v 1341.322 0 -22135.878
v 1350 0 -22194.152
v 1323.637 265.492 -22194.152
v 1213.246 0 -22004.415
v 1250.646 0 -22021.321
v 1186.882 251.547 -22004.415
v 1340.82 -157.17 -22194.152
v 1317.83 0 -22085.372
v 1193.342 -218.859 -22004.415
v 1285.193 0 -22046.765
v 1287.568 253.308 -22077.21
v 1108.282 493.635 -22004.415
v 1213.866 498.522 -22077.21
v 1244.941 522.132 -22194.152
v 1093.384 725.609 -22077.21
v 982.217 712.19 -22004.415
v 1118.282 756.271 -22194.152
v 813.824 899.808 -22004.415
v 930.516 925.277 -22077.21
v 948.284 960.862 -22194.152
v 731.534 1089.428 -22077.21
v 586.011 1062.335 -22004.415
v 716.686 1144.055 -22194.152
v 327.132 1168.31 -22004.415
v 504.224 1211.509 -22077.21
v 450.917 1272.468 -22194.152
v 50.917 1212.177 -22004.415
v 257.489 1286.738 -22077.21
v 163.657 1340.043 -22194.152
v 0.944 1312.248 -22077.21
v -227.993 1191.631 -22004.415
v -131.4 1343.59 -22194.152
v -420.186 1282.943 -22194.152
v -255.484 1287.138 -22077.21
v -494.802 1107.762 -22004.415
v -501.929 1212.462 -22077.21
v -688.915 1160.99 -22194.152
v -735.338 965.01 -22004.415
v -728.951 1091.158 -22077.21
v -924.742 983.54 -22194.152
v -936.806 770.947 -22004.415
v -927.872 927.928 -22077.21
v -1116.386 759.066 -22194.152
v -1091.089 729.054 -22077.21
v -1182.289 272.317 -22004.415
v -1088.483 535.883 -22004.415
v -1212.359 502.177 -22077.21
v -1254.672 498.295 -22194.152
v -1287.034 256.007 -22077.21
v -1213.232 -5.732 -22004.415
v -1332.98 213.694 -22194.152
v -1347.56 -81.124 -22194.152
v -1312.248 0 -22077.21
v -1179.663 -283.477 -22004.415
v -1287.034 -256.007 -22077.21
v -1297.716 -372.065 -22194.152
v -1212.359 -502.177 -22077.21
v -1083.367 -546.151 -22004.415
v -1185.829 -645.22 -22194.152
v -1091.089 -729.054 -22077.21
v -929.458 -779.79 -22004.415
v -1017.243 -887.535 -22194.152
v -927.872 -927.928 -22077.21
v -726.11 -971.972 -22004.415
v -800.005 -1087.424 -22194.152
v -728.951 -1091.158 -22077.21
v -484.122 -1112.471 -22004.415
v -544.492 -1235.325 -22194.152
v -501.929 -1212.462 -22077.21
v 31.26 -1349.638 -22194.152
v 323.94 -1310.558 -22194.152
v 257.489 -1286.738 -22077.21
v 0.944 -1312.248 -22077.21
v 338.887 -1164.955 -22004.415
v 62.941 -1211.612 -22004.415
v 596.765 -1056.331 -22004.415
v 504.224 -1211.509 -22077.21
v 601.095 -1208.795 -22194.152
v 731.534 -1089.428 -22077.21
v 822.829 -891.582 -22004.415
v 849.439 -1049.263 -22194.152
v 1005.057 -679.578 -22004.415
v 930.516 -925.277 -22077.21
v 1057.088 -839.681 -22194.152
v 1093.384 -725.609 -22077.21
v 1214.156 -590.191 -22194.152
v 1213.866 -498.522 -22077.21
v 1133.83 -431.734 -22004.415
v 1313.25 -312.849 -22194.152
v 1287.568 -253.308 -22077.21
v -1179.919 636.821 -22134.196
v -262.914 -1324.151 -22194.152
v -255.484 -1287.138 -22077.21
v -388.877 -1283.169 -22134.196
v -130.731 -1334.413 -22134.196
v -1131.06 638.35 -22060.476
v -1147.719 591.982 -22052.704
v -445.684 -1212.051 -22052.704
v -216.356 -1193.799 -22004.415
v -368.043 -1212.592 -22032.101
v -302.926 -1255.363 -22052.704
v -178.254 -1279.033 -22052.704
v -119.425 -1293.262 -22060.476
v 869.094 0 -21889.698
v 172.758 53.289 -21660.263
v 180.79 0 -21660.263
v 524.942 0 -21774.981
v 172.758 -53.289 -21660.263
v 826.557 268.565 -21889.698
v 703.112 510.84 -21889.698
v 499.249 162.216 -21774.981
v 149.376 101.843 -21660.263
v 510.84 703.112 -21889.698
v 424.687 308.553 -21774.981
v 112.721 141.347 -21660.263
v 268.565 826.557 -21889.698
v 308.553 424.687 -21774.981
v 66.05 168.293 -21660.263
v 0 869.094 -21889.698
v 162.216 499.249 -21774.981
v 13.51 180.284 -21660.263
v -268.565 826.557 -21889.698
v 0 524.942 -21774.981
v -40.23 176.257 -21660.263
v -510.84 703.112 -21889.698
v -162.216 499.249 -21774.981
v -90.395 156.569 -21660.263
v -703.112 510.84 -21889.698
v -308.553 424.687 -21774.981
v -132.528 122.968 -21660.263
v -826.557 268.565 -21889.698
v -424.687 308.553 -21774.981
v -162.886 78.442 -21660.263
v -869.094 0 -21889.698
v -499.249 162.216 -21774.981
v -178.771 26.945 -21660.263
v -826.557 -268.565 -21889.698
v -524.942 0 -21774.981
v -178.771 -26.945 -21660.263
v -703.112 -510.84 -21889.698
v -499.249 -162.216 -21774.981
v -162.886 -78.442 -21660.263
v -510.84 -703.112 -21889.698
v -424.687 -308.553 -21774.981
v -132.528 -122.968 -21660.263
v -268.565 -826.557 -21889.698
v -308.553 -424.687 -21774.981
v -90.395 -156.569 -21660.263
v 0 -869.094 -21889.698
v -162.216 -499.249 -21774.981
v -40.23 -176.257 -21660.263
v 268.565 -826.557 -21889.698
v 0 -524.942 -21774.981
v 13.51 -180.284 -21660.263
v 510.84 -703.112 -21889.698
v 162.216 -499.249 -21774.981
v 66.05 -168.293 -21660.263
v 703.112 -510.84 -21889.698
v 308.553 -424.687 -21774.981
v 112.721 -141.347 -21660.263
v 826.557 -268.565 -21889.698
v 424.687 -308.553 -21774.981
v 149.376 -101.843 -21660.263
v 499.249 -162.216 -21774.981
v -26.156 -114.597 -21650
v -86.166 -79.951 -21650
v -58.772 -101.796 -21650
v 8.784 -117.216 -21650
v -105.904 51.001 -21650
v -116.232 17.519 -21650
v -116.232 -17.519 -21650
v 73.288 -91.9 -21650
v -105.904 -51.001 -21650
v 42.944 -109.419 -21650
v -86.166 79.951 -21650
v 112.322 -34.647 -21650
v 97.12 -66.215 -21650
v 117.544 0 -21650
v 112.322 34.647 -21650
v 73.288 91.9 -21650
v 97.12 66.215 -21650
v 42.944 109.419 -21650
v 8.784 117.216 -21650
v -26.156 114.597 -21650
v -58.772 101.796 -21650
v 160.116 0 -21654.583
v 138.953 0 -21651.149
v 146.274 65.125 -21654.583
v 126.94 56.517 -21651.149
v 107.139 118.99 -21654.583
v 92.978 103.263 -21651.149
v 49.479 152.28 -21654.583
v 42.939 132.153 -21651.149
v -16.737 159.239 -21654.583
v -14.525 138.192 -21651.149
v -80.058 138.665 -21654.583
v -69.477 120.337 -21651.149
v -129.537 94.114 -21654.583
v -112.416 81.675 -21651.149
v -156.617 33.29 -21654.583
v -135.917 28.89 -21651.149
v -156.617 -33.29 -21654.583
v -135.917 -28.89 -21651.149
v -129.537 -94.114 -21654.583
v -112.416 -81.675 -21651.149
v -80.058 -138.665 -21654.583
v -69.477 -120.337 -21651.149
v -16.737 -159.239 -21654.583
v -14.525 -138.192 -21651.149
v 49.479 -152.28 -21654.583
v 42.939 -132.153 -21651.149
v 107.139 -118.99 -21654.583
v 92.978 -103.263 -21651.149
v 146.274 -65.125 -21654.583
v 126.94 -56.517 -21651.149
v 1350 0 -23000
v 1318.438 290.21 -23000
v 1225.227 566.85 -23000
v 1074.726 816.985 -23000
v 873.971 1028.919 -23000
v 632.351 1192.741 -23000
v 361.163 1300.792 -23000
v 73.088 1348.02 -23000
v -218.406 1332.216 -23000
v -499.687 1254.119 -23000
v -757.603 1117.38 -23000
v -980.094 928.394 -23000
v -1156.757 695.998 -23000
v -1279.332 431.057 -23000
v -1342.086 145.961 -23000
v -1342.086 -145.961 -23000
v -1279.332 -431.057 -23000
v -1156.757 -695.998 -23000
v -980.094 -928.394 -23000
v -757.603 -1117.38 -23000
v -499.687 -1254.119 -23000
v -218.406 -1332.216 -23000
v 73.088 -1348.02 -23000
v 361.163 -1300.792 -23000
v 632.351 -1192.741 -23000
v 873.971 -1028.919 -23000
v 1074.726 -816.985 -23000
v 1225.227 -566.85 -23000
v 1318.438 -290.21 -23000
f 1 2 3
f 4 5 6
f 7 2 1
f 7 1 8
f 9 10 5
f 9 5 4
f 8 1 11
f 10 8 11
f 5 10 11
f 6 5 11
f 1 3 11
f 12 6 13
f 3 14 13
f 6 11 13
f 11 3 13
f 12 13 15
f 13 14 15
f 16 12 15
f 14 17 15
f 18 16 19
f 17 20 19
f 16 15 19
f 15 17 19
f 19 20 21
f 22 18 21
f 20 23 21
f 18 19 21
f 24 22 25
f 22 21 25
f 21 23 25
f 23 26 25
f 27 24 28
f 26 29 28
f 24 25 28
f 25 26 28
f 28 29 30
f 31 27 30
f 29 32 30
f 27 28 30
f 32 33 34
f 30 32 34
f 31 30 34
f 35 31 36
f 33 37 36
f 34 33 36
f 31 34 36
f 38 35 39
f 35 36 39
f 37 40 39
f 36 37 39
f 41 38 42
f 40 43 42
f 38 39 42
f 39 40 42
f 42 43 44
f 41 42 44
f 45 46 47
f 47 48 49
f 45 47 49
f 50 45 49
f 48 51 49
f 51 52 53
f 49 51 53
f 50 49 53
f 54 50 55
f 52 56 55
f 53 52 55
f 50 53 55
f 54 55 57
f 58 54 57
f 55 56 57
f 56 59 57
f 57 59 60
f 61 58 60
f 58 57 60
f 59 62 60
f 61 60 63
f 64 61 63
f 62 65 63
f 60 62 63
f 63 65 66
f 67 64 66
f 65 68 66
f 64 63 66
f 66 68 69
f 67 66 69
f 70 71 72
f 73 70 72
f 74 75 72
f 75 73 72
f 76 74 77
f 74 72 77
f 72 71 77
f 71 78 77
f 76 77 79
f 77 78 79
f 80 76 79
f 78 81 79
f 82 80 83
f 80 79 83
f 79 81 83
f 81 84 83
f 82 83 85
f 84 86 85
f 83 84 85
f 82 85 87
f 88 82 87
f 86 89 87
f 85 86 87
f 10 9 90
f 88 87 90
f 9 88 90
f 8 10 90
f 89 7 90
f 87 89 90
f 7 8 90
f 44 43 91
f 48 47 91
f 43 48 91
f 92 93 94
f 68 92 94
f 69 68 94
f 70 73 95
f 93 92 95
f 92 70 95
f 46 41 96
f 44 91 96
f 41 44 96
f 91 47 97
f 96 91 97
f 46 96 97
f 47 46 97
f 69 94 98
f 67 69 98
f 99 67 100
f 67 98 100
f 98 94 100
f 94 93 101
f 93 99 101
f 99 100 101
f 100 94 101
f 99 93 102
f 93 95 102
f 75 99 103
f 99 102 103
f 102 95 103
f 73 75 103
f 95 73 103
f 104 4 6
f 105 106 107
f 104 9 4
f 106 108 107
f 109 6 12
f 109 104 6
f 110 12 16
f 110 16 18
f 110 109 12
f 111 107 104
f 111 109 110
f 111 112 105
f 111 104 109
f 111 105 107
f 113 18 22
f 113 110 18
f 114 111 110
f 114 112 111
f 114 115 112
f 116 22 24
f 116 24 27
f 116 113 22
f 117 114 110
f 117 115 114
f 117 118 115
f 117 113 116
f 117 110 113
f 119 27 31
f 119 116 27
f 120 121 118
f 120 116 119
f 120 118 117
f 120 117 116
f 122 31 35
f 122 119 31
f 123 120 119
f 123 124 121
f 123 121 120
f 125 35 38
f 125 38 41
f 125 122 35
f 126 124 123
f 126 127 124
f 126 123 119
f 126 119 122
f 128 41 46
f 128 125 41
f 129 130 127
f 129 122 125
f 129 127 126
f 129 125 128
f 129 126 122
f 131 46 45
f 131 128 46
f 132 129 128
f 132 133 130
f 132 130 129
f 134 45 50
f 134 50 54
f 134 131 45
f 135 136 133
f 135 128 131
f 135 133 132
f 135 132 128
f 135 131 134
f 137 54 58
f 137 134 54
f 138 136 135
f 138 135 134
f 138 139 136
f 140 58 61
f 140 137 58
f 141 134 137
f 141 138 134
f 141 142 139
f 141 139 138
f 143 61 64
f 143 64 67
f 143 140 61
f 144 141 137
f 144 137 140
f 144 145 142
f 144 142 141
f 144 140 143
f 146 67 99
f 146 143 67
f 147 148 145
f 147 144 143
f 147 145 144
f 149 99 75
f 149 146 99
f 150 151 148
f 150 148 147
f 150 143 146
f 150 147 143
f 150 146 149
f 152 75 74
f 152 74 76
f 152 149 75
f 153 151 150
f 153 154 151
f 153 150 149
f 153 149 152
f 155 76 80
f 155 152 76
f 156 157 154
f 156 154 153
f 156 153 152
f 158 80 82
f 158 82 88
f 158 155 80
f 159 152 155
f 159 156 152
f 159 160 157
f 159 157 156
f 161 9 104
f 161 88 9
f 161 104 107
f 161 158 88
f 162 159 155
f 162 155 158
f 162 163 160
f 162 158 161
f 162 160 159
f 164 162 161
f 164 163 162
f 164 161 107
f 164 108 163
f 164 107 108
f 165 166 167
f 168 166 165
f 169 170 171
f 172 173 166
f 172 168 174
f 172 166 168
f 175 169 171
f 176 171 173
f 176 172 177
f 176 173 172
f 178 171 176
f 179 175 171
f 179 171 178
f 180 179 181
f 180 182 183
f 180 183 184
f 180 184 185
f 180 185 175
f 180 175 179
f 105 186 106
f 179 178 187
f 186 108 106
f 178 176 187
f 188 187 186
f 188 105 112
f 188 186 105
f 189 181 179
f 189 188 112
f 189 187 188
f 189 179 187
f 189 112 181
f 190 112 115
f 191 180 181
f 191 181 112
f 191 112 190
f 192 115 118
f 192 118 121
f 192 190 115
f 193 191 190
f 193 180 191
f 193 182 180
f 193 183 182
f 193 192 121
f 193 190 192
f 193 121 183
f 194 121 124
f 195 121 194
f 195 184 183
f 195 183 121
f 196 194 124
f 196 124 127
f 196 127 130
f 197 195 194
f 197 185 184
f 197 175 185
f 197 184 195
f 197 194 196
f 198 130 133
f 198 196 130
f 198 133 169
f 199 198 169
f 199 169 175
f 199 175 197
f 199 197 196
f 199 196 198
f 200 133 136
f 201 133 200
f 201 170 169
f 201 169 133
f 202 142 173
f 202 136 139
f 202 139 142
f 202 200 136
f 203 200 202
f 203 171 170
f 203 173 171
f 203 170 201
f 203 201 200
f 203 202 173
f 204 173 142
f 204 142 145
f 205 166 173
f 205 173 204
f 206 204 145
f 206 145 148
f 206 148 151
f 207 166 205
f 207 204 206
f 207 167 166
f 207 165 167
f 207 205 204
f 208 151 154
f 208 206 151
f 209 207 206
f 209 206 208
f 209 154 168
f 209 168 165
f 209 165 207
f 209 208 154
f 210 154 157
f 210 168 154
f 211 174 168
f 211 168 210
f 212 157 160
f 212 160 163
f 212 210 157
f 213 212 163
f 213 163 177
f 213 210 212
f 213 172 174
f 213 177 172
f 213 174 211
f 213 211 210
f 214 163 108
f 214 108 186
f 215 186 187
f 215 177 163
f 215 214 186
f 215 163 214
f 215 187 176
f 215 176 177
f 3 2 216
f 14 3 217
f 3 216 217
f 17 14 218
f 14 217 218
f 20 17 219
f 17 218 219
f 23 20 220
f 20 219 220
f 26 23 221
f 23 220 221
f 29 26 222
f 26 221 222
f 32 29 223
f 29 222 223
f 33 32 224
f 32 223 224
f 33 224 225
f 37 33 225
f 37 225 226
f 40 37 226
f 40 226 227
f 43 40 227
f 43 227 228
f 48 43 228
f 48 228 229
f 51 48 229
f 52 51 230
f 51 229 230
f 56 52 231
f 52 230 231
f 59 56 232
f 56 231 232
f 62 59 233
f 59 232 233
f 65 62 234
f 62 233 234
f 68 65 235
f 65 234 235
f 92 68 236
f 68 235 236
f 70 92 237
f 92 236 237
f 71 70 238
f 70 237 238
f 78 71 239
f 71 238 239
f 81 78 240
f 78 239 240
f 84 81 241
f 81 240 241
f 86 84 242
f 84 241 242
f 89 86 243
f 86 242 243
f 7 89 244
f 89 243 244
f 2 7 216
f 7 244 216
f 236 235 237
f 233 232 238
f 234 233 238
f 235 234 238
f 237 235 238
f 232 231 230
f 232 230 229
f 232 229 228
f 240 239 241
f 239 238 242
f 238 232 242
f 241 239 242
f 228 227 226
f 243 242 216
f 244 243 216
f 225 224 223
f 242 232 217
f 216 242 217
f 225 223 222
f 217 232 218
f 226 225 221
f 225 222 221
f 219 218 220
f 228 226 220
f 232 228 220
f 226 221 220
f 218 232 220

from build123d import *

# Parameters (mm, degrees)
CYLINDER006_R     = 1350
CYLINDER006_DEPTH = 1350
CHAMFER002_SIZE2  = 1200
CHAMFER002_SIZE   = 400
FILLET003_R       = 200


with BuildPart() as part:
    # Cylinder006 → Cylinder006 (new body)
    with BuildSketch(Plane.XY):
        Circle(CYLINDER006_R)
    extrude(amount=CYLINDER006_DEPTH)

    # Chamfer002
    chamfer002_edges = [part.edges().sort_by_distance(p)[0] for p in [
        (-1350, 0, 1350),
    ]]
    chamfer002_side = part.faces().sort_by_distance((-1350, 0, 675))[0]
    chamfer(chamfer002_edges, length=CHAMFER002_SIZE, length2=CHAMFER002_SIZE2, reference=chamfer002_side)

    # Fillet003
    fillet003_edges = [part.edges().sort_by_distance(p)[0] for p in [
        (-1350, 0, 950),
        (-150, 0, 1350),
    ]]
    fillet(fillet003_edges, radius=FILLET003_R)


with BuildPart() as part_1:
    # Fillet003 placement: moved
    add(part.part.moved(Location((0, 0, -23000))))


solid = part_1.part
